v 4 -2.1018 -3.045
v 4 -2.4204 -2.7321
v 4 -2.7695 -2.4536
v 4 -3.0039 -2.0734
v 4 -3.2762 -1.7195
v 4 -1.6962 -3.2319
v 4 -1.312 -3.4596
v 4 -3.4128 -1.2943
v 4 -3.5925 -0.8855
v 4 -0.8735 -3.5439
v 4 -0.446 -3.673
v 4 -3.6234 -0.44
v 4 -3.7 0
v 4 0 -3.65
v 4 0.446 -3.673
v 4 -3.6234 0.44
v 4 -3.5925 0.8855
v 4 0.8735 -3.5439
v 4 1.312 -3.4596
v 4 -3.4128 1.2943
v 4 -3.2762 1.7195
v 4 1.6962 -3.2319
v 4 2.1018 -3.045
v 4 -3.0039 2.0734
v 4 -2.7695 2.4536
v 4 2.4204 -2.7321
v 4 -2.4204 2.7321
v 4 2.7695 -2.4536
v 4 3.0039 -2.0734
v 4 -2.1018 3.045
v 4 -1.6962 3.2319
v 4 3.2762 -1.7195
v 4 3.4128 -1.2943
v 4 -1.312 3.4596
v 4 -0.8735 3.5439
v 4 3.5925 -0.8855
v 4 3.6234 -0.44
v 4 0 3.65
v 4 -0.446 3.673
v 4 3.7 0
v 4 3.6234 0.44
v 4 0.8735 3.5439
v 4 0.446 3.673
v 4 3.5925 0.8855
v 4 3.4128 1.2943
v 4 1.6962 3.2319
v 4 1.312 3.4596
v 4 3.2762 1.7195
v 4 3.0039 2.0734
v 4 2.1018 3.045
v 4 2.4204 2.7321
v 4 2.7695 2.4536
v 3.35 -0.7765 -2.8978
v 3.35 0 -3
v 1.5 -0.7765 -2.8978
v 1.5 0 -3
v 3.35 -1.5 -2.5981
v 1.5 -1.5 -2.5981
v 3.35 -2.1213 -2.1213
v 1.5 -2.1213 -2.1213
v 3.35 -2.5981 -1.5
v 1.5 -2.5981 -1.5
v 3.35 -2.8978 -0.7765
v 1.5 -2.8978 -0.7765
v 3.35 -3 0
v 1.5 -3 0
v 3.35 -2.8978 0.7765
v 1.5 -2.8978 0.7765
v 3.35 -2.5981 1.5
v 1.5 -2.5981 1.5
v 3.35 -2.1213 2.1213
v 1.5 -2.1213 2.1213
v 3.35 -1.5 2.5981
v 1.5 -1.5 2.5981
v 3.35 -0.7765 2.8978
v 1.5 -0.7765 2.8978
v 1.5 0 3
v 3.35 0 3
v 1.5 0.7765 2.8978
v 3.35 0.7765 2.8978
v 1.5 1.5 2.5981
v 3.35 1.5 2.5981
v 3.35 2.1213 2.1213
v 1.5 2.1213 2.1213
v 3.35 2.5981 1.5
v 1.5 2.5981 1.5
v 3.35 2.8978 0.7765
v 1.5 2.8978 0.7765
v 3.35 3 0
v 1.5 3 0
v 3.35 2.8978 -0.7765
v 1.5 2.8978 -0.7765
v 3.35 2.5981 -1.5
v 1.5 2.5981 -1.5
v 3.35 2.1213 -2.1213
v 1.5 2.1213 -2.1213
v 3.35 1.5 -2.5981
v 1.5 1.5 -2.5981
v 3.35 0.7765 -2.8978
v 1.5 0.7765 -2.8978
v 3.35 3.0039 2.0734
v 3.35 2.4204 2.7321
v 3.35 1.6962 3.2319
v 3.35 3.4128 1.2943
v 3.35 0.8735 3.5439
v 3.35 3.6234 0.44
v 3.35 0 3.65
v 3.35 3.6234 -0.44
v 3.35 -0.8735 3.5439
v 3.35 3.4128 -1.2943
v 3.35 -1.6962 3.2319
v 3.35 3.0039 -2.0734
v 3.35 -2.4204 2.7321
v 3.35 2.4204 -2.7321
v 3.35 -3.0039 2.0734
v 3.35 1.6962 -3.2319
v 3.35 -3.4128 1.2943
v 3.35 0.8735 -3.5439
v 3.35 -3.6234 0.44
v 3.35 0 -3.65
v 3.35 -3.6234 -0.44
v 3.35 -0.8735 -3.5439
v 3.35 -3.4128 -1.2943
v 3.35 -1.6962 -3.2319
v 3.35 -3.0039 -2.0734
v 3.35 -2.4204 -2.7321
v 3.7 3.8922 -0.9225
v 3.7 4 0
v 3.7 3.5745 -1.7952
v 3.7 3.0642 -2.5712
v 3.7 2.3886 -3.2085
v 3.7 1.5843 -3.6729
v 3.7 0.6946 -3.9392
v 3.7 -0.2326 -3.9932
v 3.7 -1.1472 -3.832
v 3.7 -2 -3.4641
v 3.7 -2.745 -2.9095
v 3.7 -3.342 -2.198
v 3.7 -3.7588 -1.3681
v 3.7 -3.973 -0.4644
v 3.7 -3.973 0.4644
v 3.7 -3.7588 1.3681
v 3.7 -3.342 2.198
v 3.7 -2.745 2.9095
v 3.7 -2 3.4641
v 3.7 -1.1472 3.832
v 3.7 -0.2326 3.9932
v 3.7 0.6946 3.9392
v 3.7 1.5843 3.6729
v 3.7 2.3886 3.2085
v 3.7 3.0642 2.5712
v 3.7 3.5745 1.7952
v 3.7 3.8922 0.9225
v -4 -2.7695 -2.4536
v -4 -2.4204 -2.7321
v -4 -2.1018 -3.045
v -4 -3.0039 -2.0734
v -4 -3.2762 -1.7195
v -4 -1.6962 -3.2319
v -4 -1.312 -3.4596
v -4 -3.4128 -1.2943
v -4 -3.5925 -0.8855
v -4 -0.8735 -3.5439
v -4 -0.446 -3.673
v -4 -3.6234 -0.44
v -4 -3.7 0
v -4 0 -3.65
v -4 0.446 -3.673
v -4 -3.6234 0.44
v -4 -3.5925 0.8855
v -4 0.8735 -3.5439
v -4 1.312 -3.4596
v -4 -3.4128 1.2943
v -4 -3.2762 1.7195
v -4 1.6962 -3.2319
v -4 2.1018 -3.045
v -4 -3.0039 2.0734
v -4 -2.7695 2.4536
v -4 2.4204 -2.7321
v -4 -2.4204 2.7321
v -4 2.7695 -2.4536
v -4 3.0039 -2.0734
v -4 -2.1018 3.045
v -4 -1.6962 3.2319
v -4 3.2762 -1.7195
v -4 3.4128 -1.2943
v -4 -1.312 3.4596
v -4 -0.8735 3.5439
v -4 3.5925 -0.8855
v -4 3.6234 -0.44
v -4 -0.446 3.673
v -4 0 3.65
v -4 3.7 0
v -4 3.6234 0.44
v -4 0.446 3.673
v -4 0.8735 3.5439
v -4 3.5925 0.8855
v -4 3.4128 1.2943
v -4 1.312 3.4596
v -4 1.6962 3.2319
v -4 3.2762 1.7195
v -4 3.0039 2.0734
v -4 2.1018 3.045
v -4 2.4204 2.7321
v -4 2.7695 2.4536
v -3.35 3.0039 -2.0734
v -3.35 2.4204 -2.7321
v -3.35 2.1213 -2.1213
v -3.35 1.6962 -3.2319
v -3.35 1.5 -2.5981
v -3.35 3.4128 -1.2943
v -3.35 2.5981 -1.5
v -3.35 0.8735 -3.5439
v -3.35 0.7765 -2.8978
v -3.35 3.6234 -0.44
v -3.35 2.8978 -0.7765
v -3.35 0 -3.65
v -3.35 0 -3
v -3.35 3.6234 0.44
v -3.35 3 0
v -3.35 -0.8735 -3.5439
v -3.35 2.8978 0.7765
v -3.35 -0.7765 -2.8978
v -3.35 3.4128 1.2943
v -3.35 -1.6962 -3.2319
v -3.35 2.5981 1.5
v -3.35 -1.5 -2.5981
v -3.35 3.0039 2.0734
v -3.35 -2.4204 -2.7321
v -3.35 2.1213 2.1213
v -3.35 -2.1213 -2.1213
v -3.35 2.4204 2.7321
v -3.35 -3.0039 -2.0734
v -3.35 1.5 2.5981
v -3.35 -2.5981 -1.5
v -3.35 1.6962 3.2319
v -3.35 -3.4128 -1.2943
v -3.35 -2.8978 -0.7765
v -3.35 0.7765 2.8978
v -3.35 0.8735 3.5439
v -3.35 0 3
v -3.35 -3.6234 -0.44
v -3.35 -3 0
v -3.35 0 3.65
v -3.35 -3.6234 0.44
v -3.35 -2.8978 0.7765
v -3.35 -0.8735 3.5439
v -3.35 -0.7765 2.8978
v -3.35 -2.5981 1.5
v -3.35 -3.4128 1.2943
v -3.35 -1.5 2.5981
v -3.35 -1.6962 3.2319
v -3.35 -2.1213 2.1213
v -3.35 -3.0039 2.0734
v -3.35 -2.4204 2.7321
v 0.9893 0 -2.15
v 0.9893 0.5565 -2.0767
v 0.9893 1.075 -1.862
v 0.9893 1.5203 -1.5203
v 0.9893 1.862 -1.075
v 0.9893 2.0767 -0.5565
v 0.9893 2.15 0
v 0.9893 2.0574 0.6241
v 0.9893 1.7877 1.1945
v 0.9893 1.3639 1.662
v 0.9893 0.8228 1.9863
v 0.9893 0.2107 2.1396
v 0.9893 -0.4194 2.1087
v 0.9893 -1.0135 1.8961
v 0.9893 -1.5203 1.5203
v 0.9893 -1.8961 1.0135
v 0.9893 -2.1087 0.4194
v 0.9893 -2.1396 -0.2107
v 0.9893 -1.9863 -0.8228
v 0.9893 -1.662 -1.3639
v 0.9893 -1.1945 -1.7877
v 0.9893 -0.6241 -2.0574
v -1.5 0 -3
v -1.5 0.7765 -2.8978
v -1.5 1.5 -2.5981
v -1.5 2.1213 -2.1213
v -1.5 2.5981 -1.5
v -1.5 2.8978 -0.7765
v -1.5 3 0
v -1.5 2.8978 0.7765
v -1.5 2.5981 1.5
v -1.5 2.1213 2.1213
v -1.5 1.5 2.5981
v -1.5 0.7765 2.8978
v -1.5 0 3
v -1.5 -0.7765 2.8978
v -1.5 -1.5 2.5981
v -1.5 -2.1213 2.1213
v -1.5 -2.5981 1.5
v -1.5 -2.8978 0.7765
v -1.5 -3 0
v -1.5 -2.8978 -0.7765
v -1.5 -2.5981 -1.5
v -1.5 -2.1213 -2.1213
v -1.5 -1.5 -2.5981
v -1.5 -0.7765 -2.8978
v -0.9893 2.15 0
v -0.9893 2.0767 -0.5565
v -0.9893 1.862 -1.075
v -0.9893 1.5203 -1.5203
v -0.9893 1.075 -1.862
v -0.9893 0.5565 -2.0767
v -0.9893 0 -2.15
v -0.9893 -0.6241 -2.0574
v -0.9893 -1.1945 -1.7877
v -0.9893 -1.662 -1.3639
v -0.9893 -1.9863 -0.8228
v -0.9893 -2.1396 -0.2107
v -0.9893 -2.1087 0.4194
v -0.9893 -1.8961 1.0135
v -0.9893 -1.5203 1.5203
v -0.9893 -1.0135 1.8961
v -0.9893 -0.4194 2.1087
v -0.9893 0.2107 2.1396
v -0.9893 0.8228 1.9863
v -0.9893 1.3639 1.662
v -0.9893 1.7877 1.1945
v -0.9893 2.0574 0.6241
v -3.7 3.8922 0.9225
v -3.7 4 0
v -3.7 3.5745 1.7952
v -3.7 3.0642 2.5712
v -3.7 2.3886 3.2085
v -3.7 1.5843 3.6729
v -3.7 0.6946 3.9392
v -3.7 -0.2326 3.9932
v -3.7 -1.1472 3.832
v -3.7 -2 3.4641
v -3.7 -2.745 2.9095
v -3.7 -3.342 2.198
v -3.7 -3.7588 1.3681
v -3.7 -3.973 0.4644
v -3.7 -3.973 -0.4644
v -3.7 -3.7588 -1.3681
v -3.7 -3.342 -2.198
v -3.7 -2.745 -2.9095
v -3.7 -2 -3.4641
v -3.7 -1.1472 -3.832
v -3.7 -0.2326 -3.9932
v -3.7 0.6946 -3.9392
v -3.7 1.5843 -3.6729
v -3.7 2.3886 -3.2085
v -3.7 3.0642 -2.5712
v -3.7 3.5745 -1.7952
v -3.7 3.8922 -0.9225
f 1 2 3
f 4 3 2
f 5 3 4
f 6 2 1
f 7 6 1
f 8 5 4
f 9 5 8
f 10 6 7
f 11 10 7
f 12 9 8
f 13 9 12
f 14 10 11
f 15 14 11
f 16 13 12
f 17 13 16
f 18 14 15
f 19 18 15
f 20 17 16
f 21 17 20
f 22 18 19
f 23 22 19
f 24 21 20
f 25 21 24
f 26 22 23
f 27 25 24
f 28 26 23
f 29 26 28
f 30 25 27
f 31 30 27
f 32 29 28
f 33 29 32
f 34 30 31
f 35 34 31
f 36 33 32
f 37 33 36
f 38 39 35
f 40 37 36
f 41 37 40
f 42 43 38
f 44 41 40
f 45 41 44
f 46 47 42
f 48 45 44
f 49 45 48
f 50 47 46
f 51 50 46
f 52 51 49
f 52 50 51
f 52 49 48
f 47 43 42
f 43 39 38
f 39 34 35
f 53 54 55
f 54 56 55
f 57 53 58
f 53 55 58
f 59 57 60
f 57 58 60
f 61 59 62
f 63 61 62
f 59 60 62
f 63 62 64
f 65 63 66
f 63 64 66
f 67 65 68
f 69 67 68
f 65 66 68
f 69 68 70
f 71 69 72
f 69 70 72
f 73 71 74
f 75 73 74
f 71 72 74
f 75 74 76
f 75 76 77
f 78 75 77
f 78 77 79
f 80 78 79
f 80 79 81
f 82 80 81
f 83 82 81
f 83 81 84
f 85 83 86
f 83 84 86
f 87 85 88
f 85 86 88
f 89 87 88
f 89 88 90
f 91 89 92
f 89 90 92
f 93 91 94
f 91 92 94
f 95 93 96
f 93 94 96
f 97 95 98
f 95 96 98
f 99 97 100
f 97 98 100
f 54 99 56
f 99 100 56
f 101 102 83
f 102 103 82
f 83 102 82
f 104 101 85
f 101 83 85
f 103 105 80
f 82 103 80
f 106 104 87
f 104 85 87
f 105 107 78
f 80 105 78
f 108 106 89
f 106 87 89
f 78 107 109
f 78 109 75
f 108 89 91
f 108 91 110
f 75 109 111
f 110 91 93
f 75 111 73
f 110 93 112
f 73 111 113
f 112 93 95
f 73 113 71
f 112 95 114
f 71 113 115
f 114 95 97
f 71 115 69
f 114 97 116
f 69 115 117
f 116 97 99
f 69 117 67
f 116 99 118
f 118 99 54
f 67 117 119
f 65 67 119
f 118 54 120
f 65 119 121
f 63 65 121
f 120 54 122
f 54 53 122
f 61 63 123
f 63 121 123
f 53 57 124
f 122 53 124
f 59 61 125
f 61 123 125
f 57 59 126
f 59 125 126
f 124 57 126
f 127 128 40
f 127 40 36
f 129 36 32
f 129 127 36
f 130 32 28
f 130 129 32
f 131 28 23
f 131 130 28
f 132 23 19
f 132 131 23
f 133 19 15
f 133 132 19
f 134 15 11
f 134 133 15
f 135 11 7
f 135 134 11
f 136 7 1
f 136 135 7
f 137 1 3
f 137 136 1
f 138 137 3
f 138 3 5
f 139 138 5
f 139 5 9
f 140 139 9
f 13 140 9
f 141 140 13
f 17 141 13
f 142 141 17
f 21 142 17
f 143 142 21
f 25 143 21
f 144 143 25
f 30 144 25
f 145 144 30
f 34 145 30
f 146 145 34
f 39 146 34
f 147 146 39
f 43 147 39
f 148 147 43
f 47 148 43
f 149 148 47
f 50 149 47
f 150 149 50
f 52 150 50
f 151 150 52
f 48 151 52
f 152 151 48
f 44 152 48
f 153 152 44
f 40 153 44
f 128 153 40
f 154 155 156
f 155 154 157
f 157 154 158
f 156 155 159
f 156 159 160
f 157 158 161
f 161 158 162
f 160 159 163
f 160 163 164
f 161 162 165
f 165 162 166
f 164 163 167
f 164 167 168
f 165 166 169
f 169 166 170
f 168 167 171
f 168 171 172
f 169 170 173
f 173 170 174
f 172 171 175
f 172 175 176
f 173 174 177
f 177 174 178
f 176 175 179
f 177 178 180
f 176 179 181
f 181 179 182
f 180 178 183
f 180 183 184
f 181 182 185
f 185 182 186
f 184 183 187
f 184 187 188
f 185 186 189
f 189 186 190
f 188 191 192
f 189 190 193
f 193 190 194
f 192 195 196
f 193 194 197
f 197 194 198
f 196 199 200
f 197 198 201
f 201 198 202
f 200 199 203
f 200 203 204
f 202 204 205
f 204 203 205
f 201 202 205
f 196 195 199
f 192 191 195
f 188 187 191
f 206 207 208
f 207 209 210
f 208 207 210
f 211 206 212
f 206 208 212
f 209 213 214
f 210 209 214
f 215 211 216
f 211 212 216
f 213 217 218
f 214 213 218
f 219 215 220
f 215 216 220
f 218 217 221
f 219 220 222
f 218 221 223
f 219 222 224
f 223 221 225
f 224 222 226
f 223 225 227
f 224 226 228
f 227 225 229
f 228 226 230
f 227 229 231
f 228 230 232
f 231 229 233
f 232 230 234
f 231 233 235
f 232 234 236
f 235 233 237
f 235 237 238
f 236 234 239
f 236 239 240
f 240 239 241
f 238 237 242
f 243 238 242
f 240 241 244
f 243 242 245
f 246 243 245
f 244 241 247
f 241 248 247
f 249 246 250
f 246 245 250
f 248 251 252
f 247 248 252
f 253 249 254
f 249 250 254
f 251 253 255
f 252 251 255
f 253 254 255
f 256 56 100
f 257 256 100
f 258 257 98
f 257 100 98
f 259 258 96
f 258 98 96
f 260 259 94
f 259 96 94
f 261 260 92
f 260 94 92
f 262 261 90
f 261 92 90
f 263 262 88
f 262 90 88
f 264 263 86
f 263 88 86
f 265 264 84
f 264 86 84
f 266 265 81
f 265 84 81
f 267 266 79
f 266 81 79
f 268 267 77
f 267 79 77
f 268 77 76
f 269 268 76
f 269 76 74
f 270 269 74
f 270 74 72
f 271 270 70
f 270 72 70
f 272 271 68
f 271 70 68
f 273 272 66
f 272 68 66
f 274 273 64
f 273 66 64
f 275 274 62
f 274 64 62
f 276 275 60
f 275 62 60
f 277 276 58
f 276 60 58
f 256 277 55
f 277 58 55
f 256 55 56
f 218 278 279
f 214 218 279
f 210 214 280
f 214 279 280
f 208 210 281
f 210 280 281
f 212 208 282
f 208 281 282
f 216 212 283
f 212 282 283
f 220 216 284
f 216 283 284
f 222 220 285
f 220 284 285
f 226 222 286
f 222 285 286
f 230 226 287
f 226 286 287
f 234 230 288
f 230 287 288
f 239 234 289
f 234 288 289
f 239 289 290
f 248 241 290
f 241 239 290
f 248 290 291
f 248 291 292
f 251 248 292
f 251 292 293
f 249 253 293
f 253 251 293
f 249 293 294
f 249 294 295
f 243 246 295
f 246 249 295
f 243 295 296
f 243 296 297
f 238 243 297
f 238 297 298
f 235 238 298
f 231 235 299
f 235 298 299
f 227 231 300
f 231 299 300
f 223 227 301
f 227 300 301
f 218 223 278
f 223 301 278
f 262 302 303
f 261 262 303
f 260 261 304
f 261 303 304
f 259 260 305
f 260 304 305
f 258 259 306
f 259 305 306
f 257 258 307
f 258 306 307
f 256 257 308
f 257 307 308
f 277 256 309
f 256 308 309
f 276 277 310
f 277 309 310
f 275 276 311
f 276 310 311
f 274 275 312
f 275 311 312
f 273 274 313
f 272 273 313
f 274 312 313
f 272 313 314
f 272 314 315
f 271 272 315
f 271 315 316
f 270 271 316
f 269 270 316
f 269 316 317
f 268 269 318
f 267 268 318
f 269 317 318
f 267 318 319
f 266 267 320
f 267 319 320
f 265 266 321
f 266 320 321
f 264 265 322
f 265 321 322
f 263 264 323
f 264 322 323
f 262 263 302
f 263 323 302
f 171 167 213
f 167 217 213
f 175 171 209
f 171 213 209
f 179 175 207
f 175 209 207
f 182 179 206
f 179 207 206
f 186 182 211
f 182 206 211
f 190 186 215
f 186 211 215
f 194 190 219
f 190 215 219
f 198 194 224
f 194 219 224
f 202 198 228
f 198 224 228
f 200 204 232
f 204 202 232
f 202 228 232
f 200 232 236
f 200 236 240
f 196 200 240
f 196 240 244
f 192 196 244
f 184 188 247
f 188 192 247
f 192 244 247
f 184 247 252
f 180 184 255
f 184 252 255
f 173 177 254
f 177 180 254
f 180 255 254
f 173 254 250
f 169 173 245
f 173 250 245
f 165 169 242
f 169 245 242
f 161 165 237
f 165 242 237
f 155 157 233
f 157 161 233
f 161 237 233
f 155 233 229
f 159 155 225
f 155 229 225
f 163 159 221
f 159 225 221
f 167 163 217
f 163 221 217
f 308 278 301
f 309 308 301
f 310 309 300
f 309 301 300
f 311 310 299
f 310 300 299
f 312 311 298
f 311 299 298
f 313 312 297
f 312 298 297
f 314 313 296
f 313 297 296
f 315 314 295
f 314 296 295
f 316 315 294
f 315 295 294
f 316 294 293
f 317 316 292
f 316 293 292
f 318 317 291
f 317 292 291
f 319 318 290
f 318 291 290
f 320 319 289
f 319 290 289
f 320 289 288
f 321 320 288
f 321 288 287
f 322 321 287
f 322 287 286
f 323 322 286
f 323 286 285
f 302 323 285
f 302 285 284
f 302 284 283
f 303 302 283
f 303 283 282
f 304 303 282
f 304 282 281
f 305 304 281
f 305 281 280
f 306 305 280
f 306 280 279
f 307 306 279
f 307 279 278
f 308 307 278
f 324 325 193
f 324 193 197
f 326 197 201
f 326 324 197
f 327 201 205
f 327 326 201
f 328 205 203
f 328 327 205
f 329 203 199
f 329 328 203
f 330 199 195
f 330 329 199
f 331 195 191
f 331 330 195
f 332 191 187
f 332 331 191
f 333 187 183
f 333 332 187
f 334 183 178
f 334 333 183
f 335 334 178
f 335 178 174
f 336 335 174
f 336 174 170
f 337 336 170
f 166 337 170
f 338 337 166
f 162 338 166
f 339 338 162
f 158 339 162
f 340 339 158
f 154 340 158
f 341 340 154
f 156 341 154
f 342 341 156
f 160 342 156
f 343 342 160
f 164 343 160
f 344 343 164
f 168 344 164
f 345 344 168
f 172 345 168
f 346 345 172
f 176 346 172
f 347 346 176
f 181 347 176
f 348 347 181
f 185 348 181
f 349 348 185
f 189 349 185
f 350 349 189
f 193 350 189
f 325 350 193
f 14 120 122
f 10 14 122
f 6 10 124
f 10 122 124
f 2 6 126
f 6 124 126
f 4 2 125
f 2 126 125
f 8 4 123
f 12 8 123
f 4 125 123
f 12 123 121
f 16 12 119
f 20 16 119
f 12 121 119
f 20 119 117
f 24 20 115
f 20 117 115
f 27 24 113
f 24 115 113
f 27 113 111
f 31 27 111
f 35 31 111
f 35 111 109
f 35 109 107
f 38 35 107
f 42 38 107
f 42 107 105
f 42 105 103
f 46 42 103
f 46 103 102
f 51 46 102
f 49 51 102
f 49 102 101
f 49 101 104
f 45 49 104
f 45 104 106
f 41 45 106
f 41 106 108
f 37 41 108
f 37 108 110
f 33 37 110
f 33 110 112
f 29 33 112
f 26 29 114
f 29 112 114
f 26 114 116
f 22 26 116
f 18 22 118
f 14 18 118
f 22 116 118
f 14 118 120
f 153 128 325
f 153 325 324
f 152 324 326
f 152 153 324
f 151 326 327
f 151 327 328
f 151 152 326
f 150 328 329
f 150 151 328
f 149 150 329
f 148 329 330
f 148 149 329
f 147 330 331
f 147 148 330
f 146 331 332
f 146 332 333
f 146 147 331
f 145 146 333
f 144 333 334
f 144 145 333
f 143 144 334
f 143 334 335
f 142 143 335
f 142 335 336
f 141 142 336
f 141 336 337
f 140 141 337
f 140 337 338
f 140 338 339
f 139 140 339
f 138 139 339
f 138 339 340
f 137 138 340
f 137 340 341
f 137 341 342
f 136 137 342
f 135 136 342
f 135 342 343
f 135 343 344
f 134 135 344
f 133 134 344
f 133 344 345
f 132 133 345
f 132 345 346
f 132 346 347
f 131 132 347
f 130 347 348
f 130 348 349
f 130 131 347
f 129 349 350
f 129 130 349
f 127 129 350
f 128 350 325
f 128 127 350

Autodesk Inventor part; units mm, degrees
ref_plane "YZ Plane" through (0, 0, 0) normal (1, 0, 0) x (0, 1, 0)
ref_plane "XZ Plane" through (0, 0, 0) normal (0, 1, 0) x (-1, 0, 0)
ref_plane "XY Plane" through (0, 0, 0) normal (0, 0, 1) x (1, 0, 0)
sketch "スケッチ1" plane through (0, 0, 0) normal (0, 0, 1) x (1, 0, 0)
  line L0 (-4, 4) -> (4, 4)
  line L1 (4, 4) -> (4, 2.15)
  line L2 (4, 2.15) -> (-4, 2.15)
  line L3 (-4, 2.15) -> (-4, 4)
  line L4 (0, 0) -> (0, 4.5155) construction
  line L5 (0, 0) -> (8.3877, 0) construction
  dimension "d0" = 8
  dimension "d1" = 4.3
  dimension "d2" = 8
revolve "回転1" add sketch "スケッチ1" angle 360 about axis through (0, 0, 0) along (1, 0, 0)
chamfer "面取り1" distance 0.3 angle 45 2 edges at (4, -4, 0) (-4, -4, 0)
sketch "スケッチ2" plane through (4, 0, 0) normal (1, 0, 0) x (0, 0, -1)
  point P0 (0, 0)
  point P1 (0, 0)
hole "穴1" at (4, 0, 0) direction (-1, 0, 0) diameter 6 depth 2.5 tip angle 118 counterbore diameter 7.3 counterbore depth 0.65
mirror "ミラー1" about plane through (0, 0, 0) normal (1, 0, 0) of "穴1"
properties part number "BELT_SUPPORT_OUTER"
